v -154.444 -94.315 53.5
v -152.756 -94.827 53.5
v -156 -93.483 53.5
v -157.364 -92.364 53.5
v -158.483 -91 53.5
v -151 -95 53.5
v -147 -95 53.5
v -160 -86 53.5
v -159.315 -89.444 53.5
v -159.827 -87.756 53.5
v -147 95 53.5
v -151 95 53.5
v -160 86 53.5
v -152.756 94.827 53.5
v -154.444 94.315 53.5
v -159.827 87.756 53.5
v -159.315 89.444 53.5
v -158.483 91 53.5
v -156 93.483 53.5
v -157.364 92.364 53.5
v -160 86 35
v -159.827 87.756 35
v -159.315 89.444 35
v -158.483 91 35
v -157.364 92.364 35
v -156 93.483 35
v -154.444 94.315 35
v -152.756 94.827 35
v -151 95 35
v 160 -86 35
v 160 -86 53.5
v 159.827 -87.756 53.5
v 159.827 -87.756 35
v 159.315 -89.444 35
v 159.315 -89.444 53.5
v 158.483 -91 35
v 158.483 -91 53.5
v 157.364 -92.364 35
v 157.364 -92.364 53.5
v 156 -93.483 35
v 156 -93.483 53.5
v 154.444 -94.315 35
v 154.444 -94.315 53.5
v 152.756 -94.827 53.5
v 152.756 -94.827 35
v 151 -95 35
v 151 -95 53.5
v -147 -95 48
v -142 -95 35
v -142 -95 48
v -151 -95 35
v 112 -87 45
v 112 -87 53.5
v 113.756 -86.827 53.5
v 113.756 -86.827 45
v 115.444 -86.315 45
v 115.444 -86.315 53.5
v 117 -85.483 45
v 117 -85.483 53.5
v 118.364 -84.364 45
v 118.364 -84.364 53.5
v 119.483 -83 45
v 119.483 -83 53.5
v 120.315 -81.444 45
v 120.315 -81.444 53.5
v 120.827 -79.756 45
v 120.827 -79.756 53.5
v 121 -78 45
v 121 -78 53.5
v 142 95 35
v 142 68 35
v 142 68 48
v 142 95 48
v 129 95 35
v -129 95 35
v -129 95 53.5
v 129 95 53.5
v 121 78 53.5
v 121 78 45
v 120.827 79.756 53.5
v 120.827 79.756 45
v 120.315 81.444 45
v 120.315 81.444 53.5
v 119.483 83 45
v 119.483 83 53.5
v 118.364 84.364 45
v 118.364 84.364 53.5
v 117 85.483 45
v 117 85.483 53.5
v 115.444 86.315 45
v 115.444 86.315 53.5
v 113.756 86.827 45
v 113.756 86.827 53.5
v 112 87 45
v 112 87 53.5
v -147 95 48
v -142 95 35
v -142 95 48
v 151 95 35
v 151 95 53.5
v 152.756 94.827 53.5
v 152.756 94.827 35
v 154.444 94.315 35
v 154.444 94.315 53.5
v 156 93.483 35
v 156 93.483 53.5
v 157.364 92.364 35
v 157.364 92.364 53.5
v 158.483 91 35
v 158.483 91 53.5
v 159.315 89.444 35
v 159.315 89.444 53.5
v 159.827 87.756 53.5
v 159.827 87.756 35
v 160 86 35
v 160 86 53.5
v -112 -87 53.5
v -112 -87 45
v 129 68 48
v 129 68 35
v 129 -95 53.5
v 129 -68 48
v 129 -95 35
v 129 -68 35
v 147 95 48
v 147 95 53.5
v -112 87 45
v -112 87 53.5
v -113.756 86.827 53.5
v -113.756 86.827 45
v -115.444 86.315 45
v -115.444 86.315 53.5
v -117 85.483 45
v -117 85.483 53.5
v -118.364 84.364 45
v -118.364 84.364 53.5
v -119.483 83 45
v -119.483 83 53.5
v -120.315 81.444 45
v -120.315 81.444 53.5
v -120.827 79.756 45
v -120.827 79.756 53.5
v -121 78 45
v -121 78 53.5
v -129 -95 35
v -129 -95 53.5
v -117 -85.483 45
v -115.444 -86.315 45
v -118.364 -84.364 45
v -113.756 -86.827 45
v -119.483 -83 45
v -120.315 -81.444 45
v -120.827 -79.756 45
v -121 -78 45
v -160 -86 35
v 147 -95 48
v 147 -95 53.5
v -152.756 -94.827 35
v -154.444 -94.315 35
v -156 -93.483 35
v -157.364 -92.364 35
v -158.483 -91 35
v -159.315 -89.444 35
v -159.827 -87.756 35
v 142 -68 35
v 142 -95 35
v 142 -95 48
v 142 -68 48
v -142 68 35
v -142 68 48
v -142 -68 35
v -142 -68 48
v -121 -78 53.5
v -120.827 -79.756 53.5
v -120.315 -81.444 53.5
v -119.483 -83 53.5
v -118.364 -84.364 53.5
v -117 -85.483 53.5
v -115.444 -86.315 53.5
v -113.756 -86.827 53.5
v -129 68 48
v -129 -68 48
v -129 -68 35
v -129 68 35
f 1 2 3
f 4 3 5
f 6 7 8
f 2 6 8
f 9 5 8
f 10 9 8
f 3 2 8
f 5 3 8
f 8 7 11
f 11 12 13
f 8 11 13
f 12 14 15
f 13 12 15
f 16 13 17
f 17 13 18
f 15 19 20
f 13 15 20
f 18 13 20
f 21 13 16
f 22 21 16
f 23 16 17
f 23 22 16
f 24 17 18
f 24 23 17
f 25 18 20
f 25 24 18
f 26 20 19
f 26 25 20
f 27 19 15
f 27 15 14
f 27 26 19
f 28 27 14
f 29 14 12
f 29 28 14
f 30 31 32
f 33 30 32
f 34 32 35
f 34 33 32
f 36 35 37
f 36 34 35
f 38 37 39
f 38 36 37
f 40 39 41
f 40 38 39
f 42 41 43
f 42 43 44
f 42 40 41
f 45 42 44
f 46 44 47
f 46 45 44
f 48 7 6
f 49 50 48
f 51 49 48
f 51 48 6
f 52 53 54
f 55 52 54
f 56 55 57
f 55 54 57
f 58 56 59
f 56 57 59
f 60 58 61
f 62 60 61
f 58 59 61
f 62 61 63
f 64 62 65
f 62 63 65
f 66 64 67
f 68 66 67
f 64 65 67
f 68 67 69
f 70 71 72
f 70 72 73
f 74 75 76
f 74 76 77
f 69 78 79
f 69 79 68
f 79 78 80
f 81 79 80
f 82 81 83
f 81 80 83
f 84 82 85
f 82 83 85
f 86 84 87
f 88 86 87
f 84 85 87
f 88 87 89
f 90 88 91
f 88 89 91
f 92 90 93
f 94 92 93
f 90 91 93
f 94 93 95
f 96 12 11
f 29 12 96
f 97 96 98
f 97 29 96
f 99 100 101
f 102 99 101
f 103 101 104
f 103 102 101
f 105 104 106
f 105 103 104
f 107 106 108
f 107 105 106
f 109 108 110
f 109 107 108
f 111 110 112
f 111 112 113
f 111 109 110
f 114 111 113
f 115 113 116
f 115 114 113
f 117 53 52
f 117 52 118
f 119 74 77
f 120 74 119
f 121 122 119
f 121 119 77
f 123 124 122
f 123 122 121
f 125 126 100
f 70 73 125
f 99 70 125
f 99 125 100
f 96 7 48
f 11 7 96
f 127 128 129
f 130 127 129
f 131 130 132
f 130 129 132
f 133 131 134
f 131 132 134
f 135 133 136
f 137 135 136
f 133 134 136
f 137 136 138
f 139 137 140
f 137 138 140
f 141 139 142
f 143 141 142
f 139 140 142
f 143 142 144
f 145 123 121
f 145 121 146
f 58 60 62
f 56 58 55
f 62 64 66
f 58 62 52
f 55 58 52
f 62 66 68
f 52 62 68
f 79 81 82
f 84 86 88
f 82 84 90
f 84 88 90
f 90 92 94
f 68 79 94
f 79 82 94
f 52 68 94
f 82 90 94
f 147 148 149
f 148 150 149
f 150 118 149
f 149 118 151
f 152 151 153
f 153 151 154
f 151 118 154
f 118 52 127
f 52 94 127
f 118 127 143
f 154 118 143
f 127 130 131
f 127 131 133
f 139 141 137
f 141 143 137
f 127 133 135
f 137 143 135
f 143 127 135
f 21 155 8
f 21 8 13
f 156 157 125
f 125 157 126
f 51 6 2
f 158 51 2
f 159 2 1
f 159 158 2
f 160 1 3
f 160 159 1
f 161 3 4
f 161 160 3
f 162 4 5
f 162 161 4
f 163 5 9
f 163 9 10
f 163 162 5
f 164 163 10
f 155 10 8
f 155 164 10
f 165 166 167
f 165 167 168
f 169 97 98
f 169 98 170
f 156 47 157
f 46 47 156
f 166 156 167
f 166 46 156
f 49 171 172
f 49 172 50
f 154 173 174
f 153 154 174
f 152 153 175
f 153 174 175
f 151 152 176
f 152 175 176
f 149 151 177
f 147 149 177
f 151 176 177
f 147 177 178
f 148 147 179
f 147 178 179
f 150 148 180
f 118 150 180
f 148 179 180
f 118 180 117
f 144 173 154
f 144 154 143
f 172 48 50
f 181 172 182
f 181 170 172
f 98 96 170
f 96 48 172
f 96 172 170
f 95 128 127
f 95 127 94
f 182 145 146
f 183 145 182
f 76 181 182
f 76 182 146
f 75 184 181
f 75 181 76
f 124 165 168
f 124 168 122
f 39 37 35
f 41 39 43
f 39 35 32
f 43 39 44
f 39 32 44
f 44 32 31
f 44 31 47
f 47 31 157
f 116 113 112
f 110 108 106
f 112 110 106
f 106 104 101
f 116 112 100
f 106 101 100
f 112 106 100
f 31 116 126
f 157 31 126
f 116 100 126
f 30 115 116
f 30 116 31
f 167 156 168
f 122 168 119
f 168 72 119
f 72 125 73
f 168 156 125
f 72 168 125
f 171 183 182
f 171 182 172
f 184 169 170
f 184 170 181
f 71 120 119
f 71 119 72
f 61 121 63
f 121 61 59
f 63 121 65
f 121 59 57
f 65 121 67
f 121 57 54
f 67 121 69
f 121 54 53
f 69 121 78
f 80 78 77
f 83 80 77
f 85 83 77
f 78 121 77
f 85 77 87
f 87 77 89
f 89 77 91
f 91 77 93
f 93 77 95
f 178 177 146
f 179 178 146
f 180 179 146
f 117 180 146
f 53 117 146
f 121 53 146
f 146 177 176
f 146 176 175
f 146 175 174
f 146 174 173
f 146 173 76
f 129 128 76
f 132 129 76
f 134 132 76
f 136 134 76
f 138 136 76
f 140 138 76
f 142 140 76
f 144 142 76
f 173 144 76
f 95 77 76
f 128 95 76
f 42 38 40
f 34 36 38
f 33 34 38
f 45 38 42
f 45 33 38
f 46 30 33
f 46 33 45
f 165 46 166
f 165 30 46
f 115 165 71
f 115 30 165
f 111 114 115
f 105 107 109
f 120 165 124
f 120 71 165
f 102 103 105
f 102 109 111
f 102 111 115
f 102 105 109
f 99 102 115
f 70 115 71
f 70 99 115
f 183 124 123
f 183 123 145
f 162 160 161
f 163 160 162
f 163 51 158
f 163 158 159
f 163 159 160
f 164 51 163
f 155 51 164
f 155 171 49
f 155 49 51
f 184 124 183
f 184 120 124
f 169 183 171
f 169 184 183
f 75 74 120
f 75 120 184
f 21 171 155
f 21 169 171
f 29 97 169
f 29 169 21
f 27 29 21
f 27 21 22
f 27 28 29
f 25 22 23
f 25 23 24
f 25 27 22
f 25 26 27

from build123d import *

# Parameters (mm, degrees)
PAD003_DEPTH    = 18.5
SKETCH005_W     = 18
SKETCH005_H     = 190
POCKET_DEPTH    = 5.5
POCKET001_DEPTH = 8.5


with BuildPart() as part:
    # Clone2D002 → Pad003 (new body)
    with BuildSketch(Plane.XY):
        with BuildLine():
            Line((-151, 95), (-142, 95))
            Line((-142, 95), (-142, 68))
            Line((-142, 68), (-129, 68))
            Line((-129, 68), (-129, 95))
            Line((-129, 95), (129, 95))
            Line((129, 95), (129, 68))
            Line((129, 68), (142, 68))
            Line((142, 68), (142, 95))
            Line((142, 95), (151, 95))
            ThreePointArc((151, 95), (157.363961, 92.363961), (160, 86))
            Line((160, 86), (160, -86))
            ThreePointArc((160, -86), (157.363961, -92.363961), (151, -95))
            Line((151, -95), (142, -95))
            Line((142, -95), (142, -68))
            Line((142, -68), (129, -68))
            Line((129, -68), (129, -95))
            Line((129, -95), (-129, -95))
            Line((-129, -95), (-129, -68))
            Line((-129, -68), (-142, -68))
            Line((-142, -68), (-142, -95))
            Line((-142, -95), (-151, -95))
            ThreePointArc((-151, -95), (-157.363961, -92.363961), (-160, -86))
            Line((-160, -86), (-160, 86))
            ThreePointArc((-160, 86), (-157.363961, 92.363961), (-151, 95))
        make_face()
    extrude(amount=PAD003_DEPTH)

    # Sketch005 (on Face26 of Pad003) → Pocket (cut)
    with BuildSketch(Plane.XY.offset(18.5)):
        with Locations((-138, 0)):
            Rectangle(SKETCH005_W, SKETCH005_H)
    pocket = extrude(amount=-POCKET_DEPTH, mode=Mode.SUBTRACT)

    # Mirrored: Pocket across Sketch005 V_Axis
    add(pocket.mirror(Plane(origin=(0, 0, 18.5), x_dir=(0, 0, 1), z_dir=(1, 0, 0))), mode=Mode.SUBTRACT)

    # Sketch006 (on Face31 of Pocket) → Pocket001 (cut)
    with BuildSketch(Plane.XY.offset(18.5)):
        with BuildLine():
            Line((-112, 87), (112, 87))
            ThreePointArc((121, 78), (118.363961, 84.363961), (112, 87))
            Line((121, 78), (121, -78))
            ThreePointArc((112, -87), (118.363961, -84.363961), (121, -78))
            Line((112, -87), (-112, -87))
            ThreePointArc((-121, -78), (-118.363961, -84.363961), (-112, -87))
            Line((-121, -78), (-121, 78))
            ThreePointArc((-112, 87), (-118.363961, 84.363961), (-121, 78))
        make_face()
    pocket001 = extrude(amount=-POCKET001_DEPTH, mode=Mode.SUBTRACT)

    # Mirrored001: Pocket001 across Sketch006 V_Axis
    add(pocket001.mirror(Plane(origin=(0, 0, 18.5), x_dir=(0, 0, 1), z_dir=(1, 0, 0))), mode=Mode.SUBTRACT)


with BuildPart() as part_1:
    # Clone001 placement: moved
    add(part.part.moved(Location((0, 0, 35))))


solid = part_1.part
